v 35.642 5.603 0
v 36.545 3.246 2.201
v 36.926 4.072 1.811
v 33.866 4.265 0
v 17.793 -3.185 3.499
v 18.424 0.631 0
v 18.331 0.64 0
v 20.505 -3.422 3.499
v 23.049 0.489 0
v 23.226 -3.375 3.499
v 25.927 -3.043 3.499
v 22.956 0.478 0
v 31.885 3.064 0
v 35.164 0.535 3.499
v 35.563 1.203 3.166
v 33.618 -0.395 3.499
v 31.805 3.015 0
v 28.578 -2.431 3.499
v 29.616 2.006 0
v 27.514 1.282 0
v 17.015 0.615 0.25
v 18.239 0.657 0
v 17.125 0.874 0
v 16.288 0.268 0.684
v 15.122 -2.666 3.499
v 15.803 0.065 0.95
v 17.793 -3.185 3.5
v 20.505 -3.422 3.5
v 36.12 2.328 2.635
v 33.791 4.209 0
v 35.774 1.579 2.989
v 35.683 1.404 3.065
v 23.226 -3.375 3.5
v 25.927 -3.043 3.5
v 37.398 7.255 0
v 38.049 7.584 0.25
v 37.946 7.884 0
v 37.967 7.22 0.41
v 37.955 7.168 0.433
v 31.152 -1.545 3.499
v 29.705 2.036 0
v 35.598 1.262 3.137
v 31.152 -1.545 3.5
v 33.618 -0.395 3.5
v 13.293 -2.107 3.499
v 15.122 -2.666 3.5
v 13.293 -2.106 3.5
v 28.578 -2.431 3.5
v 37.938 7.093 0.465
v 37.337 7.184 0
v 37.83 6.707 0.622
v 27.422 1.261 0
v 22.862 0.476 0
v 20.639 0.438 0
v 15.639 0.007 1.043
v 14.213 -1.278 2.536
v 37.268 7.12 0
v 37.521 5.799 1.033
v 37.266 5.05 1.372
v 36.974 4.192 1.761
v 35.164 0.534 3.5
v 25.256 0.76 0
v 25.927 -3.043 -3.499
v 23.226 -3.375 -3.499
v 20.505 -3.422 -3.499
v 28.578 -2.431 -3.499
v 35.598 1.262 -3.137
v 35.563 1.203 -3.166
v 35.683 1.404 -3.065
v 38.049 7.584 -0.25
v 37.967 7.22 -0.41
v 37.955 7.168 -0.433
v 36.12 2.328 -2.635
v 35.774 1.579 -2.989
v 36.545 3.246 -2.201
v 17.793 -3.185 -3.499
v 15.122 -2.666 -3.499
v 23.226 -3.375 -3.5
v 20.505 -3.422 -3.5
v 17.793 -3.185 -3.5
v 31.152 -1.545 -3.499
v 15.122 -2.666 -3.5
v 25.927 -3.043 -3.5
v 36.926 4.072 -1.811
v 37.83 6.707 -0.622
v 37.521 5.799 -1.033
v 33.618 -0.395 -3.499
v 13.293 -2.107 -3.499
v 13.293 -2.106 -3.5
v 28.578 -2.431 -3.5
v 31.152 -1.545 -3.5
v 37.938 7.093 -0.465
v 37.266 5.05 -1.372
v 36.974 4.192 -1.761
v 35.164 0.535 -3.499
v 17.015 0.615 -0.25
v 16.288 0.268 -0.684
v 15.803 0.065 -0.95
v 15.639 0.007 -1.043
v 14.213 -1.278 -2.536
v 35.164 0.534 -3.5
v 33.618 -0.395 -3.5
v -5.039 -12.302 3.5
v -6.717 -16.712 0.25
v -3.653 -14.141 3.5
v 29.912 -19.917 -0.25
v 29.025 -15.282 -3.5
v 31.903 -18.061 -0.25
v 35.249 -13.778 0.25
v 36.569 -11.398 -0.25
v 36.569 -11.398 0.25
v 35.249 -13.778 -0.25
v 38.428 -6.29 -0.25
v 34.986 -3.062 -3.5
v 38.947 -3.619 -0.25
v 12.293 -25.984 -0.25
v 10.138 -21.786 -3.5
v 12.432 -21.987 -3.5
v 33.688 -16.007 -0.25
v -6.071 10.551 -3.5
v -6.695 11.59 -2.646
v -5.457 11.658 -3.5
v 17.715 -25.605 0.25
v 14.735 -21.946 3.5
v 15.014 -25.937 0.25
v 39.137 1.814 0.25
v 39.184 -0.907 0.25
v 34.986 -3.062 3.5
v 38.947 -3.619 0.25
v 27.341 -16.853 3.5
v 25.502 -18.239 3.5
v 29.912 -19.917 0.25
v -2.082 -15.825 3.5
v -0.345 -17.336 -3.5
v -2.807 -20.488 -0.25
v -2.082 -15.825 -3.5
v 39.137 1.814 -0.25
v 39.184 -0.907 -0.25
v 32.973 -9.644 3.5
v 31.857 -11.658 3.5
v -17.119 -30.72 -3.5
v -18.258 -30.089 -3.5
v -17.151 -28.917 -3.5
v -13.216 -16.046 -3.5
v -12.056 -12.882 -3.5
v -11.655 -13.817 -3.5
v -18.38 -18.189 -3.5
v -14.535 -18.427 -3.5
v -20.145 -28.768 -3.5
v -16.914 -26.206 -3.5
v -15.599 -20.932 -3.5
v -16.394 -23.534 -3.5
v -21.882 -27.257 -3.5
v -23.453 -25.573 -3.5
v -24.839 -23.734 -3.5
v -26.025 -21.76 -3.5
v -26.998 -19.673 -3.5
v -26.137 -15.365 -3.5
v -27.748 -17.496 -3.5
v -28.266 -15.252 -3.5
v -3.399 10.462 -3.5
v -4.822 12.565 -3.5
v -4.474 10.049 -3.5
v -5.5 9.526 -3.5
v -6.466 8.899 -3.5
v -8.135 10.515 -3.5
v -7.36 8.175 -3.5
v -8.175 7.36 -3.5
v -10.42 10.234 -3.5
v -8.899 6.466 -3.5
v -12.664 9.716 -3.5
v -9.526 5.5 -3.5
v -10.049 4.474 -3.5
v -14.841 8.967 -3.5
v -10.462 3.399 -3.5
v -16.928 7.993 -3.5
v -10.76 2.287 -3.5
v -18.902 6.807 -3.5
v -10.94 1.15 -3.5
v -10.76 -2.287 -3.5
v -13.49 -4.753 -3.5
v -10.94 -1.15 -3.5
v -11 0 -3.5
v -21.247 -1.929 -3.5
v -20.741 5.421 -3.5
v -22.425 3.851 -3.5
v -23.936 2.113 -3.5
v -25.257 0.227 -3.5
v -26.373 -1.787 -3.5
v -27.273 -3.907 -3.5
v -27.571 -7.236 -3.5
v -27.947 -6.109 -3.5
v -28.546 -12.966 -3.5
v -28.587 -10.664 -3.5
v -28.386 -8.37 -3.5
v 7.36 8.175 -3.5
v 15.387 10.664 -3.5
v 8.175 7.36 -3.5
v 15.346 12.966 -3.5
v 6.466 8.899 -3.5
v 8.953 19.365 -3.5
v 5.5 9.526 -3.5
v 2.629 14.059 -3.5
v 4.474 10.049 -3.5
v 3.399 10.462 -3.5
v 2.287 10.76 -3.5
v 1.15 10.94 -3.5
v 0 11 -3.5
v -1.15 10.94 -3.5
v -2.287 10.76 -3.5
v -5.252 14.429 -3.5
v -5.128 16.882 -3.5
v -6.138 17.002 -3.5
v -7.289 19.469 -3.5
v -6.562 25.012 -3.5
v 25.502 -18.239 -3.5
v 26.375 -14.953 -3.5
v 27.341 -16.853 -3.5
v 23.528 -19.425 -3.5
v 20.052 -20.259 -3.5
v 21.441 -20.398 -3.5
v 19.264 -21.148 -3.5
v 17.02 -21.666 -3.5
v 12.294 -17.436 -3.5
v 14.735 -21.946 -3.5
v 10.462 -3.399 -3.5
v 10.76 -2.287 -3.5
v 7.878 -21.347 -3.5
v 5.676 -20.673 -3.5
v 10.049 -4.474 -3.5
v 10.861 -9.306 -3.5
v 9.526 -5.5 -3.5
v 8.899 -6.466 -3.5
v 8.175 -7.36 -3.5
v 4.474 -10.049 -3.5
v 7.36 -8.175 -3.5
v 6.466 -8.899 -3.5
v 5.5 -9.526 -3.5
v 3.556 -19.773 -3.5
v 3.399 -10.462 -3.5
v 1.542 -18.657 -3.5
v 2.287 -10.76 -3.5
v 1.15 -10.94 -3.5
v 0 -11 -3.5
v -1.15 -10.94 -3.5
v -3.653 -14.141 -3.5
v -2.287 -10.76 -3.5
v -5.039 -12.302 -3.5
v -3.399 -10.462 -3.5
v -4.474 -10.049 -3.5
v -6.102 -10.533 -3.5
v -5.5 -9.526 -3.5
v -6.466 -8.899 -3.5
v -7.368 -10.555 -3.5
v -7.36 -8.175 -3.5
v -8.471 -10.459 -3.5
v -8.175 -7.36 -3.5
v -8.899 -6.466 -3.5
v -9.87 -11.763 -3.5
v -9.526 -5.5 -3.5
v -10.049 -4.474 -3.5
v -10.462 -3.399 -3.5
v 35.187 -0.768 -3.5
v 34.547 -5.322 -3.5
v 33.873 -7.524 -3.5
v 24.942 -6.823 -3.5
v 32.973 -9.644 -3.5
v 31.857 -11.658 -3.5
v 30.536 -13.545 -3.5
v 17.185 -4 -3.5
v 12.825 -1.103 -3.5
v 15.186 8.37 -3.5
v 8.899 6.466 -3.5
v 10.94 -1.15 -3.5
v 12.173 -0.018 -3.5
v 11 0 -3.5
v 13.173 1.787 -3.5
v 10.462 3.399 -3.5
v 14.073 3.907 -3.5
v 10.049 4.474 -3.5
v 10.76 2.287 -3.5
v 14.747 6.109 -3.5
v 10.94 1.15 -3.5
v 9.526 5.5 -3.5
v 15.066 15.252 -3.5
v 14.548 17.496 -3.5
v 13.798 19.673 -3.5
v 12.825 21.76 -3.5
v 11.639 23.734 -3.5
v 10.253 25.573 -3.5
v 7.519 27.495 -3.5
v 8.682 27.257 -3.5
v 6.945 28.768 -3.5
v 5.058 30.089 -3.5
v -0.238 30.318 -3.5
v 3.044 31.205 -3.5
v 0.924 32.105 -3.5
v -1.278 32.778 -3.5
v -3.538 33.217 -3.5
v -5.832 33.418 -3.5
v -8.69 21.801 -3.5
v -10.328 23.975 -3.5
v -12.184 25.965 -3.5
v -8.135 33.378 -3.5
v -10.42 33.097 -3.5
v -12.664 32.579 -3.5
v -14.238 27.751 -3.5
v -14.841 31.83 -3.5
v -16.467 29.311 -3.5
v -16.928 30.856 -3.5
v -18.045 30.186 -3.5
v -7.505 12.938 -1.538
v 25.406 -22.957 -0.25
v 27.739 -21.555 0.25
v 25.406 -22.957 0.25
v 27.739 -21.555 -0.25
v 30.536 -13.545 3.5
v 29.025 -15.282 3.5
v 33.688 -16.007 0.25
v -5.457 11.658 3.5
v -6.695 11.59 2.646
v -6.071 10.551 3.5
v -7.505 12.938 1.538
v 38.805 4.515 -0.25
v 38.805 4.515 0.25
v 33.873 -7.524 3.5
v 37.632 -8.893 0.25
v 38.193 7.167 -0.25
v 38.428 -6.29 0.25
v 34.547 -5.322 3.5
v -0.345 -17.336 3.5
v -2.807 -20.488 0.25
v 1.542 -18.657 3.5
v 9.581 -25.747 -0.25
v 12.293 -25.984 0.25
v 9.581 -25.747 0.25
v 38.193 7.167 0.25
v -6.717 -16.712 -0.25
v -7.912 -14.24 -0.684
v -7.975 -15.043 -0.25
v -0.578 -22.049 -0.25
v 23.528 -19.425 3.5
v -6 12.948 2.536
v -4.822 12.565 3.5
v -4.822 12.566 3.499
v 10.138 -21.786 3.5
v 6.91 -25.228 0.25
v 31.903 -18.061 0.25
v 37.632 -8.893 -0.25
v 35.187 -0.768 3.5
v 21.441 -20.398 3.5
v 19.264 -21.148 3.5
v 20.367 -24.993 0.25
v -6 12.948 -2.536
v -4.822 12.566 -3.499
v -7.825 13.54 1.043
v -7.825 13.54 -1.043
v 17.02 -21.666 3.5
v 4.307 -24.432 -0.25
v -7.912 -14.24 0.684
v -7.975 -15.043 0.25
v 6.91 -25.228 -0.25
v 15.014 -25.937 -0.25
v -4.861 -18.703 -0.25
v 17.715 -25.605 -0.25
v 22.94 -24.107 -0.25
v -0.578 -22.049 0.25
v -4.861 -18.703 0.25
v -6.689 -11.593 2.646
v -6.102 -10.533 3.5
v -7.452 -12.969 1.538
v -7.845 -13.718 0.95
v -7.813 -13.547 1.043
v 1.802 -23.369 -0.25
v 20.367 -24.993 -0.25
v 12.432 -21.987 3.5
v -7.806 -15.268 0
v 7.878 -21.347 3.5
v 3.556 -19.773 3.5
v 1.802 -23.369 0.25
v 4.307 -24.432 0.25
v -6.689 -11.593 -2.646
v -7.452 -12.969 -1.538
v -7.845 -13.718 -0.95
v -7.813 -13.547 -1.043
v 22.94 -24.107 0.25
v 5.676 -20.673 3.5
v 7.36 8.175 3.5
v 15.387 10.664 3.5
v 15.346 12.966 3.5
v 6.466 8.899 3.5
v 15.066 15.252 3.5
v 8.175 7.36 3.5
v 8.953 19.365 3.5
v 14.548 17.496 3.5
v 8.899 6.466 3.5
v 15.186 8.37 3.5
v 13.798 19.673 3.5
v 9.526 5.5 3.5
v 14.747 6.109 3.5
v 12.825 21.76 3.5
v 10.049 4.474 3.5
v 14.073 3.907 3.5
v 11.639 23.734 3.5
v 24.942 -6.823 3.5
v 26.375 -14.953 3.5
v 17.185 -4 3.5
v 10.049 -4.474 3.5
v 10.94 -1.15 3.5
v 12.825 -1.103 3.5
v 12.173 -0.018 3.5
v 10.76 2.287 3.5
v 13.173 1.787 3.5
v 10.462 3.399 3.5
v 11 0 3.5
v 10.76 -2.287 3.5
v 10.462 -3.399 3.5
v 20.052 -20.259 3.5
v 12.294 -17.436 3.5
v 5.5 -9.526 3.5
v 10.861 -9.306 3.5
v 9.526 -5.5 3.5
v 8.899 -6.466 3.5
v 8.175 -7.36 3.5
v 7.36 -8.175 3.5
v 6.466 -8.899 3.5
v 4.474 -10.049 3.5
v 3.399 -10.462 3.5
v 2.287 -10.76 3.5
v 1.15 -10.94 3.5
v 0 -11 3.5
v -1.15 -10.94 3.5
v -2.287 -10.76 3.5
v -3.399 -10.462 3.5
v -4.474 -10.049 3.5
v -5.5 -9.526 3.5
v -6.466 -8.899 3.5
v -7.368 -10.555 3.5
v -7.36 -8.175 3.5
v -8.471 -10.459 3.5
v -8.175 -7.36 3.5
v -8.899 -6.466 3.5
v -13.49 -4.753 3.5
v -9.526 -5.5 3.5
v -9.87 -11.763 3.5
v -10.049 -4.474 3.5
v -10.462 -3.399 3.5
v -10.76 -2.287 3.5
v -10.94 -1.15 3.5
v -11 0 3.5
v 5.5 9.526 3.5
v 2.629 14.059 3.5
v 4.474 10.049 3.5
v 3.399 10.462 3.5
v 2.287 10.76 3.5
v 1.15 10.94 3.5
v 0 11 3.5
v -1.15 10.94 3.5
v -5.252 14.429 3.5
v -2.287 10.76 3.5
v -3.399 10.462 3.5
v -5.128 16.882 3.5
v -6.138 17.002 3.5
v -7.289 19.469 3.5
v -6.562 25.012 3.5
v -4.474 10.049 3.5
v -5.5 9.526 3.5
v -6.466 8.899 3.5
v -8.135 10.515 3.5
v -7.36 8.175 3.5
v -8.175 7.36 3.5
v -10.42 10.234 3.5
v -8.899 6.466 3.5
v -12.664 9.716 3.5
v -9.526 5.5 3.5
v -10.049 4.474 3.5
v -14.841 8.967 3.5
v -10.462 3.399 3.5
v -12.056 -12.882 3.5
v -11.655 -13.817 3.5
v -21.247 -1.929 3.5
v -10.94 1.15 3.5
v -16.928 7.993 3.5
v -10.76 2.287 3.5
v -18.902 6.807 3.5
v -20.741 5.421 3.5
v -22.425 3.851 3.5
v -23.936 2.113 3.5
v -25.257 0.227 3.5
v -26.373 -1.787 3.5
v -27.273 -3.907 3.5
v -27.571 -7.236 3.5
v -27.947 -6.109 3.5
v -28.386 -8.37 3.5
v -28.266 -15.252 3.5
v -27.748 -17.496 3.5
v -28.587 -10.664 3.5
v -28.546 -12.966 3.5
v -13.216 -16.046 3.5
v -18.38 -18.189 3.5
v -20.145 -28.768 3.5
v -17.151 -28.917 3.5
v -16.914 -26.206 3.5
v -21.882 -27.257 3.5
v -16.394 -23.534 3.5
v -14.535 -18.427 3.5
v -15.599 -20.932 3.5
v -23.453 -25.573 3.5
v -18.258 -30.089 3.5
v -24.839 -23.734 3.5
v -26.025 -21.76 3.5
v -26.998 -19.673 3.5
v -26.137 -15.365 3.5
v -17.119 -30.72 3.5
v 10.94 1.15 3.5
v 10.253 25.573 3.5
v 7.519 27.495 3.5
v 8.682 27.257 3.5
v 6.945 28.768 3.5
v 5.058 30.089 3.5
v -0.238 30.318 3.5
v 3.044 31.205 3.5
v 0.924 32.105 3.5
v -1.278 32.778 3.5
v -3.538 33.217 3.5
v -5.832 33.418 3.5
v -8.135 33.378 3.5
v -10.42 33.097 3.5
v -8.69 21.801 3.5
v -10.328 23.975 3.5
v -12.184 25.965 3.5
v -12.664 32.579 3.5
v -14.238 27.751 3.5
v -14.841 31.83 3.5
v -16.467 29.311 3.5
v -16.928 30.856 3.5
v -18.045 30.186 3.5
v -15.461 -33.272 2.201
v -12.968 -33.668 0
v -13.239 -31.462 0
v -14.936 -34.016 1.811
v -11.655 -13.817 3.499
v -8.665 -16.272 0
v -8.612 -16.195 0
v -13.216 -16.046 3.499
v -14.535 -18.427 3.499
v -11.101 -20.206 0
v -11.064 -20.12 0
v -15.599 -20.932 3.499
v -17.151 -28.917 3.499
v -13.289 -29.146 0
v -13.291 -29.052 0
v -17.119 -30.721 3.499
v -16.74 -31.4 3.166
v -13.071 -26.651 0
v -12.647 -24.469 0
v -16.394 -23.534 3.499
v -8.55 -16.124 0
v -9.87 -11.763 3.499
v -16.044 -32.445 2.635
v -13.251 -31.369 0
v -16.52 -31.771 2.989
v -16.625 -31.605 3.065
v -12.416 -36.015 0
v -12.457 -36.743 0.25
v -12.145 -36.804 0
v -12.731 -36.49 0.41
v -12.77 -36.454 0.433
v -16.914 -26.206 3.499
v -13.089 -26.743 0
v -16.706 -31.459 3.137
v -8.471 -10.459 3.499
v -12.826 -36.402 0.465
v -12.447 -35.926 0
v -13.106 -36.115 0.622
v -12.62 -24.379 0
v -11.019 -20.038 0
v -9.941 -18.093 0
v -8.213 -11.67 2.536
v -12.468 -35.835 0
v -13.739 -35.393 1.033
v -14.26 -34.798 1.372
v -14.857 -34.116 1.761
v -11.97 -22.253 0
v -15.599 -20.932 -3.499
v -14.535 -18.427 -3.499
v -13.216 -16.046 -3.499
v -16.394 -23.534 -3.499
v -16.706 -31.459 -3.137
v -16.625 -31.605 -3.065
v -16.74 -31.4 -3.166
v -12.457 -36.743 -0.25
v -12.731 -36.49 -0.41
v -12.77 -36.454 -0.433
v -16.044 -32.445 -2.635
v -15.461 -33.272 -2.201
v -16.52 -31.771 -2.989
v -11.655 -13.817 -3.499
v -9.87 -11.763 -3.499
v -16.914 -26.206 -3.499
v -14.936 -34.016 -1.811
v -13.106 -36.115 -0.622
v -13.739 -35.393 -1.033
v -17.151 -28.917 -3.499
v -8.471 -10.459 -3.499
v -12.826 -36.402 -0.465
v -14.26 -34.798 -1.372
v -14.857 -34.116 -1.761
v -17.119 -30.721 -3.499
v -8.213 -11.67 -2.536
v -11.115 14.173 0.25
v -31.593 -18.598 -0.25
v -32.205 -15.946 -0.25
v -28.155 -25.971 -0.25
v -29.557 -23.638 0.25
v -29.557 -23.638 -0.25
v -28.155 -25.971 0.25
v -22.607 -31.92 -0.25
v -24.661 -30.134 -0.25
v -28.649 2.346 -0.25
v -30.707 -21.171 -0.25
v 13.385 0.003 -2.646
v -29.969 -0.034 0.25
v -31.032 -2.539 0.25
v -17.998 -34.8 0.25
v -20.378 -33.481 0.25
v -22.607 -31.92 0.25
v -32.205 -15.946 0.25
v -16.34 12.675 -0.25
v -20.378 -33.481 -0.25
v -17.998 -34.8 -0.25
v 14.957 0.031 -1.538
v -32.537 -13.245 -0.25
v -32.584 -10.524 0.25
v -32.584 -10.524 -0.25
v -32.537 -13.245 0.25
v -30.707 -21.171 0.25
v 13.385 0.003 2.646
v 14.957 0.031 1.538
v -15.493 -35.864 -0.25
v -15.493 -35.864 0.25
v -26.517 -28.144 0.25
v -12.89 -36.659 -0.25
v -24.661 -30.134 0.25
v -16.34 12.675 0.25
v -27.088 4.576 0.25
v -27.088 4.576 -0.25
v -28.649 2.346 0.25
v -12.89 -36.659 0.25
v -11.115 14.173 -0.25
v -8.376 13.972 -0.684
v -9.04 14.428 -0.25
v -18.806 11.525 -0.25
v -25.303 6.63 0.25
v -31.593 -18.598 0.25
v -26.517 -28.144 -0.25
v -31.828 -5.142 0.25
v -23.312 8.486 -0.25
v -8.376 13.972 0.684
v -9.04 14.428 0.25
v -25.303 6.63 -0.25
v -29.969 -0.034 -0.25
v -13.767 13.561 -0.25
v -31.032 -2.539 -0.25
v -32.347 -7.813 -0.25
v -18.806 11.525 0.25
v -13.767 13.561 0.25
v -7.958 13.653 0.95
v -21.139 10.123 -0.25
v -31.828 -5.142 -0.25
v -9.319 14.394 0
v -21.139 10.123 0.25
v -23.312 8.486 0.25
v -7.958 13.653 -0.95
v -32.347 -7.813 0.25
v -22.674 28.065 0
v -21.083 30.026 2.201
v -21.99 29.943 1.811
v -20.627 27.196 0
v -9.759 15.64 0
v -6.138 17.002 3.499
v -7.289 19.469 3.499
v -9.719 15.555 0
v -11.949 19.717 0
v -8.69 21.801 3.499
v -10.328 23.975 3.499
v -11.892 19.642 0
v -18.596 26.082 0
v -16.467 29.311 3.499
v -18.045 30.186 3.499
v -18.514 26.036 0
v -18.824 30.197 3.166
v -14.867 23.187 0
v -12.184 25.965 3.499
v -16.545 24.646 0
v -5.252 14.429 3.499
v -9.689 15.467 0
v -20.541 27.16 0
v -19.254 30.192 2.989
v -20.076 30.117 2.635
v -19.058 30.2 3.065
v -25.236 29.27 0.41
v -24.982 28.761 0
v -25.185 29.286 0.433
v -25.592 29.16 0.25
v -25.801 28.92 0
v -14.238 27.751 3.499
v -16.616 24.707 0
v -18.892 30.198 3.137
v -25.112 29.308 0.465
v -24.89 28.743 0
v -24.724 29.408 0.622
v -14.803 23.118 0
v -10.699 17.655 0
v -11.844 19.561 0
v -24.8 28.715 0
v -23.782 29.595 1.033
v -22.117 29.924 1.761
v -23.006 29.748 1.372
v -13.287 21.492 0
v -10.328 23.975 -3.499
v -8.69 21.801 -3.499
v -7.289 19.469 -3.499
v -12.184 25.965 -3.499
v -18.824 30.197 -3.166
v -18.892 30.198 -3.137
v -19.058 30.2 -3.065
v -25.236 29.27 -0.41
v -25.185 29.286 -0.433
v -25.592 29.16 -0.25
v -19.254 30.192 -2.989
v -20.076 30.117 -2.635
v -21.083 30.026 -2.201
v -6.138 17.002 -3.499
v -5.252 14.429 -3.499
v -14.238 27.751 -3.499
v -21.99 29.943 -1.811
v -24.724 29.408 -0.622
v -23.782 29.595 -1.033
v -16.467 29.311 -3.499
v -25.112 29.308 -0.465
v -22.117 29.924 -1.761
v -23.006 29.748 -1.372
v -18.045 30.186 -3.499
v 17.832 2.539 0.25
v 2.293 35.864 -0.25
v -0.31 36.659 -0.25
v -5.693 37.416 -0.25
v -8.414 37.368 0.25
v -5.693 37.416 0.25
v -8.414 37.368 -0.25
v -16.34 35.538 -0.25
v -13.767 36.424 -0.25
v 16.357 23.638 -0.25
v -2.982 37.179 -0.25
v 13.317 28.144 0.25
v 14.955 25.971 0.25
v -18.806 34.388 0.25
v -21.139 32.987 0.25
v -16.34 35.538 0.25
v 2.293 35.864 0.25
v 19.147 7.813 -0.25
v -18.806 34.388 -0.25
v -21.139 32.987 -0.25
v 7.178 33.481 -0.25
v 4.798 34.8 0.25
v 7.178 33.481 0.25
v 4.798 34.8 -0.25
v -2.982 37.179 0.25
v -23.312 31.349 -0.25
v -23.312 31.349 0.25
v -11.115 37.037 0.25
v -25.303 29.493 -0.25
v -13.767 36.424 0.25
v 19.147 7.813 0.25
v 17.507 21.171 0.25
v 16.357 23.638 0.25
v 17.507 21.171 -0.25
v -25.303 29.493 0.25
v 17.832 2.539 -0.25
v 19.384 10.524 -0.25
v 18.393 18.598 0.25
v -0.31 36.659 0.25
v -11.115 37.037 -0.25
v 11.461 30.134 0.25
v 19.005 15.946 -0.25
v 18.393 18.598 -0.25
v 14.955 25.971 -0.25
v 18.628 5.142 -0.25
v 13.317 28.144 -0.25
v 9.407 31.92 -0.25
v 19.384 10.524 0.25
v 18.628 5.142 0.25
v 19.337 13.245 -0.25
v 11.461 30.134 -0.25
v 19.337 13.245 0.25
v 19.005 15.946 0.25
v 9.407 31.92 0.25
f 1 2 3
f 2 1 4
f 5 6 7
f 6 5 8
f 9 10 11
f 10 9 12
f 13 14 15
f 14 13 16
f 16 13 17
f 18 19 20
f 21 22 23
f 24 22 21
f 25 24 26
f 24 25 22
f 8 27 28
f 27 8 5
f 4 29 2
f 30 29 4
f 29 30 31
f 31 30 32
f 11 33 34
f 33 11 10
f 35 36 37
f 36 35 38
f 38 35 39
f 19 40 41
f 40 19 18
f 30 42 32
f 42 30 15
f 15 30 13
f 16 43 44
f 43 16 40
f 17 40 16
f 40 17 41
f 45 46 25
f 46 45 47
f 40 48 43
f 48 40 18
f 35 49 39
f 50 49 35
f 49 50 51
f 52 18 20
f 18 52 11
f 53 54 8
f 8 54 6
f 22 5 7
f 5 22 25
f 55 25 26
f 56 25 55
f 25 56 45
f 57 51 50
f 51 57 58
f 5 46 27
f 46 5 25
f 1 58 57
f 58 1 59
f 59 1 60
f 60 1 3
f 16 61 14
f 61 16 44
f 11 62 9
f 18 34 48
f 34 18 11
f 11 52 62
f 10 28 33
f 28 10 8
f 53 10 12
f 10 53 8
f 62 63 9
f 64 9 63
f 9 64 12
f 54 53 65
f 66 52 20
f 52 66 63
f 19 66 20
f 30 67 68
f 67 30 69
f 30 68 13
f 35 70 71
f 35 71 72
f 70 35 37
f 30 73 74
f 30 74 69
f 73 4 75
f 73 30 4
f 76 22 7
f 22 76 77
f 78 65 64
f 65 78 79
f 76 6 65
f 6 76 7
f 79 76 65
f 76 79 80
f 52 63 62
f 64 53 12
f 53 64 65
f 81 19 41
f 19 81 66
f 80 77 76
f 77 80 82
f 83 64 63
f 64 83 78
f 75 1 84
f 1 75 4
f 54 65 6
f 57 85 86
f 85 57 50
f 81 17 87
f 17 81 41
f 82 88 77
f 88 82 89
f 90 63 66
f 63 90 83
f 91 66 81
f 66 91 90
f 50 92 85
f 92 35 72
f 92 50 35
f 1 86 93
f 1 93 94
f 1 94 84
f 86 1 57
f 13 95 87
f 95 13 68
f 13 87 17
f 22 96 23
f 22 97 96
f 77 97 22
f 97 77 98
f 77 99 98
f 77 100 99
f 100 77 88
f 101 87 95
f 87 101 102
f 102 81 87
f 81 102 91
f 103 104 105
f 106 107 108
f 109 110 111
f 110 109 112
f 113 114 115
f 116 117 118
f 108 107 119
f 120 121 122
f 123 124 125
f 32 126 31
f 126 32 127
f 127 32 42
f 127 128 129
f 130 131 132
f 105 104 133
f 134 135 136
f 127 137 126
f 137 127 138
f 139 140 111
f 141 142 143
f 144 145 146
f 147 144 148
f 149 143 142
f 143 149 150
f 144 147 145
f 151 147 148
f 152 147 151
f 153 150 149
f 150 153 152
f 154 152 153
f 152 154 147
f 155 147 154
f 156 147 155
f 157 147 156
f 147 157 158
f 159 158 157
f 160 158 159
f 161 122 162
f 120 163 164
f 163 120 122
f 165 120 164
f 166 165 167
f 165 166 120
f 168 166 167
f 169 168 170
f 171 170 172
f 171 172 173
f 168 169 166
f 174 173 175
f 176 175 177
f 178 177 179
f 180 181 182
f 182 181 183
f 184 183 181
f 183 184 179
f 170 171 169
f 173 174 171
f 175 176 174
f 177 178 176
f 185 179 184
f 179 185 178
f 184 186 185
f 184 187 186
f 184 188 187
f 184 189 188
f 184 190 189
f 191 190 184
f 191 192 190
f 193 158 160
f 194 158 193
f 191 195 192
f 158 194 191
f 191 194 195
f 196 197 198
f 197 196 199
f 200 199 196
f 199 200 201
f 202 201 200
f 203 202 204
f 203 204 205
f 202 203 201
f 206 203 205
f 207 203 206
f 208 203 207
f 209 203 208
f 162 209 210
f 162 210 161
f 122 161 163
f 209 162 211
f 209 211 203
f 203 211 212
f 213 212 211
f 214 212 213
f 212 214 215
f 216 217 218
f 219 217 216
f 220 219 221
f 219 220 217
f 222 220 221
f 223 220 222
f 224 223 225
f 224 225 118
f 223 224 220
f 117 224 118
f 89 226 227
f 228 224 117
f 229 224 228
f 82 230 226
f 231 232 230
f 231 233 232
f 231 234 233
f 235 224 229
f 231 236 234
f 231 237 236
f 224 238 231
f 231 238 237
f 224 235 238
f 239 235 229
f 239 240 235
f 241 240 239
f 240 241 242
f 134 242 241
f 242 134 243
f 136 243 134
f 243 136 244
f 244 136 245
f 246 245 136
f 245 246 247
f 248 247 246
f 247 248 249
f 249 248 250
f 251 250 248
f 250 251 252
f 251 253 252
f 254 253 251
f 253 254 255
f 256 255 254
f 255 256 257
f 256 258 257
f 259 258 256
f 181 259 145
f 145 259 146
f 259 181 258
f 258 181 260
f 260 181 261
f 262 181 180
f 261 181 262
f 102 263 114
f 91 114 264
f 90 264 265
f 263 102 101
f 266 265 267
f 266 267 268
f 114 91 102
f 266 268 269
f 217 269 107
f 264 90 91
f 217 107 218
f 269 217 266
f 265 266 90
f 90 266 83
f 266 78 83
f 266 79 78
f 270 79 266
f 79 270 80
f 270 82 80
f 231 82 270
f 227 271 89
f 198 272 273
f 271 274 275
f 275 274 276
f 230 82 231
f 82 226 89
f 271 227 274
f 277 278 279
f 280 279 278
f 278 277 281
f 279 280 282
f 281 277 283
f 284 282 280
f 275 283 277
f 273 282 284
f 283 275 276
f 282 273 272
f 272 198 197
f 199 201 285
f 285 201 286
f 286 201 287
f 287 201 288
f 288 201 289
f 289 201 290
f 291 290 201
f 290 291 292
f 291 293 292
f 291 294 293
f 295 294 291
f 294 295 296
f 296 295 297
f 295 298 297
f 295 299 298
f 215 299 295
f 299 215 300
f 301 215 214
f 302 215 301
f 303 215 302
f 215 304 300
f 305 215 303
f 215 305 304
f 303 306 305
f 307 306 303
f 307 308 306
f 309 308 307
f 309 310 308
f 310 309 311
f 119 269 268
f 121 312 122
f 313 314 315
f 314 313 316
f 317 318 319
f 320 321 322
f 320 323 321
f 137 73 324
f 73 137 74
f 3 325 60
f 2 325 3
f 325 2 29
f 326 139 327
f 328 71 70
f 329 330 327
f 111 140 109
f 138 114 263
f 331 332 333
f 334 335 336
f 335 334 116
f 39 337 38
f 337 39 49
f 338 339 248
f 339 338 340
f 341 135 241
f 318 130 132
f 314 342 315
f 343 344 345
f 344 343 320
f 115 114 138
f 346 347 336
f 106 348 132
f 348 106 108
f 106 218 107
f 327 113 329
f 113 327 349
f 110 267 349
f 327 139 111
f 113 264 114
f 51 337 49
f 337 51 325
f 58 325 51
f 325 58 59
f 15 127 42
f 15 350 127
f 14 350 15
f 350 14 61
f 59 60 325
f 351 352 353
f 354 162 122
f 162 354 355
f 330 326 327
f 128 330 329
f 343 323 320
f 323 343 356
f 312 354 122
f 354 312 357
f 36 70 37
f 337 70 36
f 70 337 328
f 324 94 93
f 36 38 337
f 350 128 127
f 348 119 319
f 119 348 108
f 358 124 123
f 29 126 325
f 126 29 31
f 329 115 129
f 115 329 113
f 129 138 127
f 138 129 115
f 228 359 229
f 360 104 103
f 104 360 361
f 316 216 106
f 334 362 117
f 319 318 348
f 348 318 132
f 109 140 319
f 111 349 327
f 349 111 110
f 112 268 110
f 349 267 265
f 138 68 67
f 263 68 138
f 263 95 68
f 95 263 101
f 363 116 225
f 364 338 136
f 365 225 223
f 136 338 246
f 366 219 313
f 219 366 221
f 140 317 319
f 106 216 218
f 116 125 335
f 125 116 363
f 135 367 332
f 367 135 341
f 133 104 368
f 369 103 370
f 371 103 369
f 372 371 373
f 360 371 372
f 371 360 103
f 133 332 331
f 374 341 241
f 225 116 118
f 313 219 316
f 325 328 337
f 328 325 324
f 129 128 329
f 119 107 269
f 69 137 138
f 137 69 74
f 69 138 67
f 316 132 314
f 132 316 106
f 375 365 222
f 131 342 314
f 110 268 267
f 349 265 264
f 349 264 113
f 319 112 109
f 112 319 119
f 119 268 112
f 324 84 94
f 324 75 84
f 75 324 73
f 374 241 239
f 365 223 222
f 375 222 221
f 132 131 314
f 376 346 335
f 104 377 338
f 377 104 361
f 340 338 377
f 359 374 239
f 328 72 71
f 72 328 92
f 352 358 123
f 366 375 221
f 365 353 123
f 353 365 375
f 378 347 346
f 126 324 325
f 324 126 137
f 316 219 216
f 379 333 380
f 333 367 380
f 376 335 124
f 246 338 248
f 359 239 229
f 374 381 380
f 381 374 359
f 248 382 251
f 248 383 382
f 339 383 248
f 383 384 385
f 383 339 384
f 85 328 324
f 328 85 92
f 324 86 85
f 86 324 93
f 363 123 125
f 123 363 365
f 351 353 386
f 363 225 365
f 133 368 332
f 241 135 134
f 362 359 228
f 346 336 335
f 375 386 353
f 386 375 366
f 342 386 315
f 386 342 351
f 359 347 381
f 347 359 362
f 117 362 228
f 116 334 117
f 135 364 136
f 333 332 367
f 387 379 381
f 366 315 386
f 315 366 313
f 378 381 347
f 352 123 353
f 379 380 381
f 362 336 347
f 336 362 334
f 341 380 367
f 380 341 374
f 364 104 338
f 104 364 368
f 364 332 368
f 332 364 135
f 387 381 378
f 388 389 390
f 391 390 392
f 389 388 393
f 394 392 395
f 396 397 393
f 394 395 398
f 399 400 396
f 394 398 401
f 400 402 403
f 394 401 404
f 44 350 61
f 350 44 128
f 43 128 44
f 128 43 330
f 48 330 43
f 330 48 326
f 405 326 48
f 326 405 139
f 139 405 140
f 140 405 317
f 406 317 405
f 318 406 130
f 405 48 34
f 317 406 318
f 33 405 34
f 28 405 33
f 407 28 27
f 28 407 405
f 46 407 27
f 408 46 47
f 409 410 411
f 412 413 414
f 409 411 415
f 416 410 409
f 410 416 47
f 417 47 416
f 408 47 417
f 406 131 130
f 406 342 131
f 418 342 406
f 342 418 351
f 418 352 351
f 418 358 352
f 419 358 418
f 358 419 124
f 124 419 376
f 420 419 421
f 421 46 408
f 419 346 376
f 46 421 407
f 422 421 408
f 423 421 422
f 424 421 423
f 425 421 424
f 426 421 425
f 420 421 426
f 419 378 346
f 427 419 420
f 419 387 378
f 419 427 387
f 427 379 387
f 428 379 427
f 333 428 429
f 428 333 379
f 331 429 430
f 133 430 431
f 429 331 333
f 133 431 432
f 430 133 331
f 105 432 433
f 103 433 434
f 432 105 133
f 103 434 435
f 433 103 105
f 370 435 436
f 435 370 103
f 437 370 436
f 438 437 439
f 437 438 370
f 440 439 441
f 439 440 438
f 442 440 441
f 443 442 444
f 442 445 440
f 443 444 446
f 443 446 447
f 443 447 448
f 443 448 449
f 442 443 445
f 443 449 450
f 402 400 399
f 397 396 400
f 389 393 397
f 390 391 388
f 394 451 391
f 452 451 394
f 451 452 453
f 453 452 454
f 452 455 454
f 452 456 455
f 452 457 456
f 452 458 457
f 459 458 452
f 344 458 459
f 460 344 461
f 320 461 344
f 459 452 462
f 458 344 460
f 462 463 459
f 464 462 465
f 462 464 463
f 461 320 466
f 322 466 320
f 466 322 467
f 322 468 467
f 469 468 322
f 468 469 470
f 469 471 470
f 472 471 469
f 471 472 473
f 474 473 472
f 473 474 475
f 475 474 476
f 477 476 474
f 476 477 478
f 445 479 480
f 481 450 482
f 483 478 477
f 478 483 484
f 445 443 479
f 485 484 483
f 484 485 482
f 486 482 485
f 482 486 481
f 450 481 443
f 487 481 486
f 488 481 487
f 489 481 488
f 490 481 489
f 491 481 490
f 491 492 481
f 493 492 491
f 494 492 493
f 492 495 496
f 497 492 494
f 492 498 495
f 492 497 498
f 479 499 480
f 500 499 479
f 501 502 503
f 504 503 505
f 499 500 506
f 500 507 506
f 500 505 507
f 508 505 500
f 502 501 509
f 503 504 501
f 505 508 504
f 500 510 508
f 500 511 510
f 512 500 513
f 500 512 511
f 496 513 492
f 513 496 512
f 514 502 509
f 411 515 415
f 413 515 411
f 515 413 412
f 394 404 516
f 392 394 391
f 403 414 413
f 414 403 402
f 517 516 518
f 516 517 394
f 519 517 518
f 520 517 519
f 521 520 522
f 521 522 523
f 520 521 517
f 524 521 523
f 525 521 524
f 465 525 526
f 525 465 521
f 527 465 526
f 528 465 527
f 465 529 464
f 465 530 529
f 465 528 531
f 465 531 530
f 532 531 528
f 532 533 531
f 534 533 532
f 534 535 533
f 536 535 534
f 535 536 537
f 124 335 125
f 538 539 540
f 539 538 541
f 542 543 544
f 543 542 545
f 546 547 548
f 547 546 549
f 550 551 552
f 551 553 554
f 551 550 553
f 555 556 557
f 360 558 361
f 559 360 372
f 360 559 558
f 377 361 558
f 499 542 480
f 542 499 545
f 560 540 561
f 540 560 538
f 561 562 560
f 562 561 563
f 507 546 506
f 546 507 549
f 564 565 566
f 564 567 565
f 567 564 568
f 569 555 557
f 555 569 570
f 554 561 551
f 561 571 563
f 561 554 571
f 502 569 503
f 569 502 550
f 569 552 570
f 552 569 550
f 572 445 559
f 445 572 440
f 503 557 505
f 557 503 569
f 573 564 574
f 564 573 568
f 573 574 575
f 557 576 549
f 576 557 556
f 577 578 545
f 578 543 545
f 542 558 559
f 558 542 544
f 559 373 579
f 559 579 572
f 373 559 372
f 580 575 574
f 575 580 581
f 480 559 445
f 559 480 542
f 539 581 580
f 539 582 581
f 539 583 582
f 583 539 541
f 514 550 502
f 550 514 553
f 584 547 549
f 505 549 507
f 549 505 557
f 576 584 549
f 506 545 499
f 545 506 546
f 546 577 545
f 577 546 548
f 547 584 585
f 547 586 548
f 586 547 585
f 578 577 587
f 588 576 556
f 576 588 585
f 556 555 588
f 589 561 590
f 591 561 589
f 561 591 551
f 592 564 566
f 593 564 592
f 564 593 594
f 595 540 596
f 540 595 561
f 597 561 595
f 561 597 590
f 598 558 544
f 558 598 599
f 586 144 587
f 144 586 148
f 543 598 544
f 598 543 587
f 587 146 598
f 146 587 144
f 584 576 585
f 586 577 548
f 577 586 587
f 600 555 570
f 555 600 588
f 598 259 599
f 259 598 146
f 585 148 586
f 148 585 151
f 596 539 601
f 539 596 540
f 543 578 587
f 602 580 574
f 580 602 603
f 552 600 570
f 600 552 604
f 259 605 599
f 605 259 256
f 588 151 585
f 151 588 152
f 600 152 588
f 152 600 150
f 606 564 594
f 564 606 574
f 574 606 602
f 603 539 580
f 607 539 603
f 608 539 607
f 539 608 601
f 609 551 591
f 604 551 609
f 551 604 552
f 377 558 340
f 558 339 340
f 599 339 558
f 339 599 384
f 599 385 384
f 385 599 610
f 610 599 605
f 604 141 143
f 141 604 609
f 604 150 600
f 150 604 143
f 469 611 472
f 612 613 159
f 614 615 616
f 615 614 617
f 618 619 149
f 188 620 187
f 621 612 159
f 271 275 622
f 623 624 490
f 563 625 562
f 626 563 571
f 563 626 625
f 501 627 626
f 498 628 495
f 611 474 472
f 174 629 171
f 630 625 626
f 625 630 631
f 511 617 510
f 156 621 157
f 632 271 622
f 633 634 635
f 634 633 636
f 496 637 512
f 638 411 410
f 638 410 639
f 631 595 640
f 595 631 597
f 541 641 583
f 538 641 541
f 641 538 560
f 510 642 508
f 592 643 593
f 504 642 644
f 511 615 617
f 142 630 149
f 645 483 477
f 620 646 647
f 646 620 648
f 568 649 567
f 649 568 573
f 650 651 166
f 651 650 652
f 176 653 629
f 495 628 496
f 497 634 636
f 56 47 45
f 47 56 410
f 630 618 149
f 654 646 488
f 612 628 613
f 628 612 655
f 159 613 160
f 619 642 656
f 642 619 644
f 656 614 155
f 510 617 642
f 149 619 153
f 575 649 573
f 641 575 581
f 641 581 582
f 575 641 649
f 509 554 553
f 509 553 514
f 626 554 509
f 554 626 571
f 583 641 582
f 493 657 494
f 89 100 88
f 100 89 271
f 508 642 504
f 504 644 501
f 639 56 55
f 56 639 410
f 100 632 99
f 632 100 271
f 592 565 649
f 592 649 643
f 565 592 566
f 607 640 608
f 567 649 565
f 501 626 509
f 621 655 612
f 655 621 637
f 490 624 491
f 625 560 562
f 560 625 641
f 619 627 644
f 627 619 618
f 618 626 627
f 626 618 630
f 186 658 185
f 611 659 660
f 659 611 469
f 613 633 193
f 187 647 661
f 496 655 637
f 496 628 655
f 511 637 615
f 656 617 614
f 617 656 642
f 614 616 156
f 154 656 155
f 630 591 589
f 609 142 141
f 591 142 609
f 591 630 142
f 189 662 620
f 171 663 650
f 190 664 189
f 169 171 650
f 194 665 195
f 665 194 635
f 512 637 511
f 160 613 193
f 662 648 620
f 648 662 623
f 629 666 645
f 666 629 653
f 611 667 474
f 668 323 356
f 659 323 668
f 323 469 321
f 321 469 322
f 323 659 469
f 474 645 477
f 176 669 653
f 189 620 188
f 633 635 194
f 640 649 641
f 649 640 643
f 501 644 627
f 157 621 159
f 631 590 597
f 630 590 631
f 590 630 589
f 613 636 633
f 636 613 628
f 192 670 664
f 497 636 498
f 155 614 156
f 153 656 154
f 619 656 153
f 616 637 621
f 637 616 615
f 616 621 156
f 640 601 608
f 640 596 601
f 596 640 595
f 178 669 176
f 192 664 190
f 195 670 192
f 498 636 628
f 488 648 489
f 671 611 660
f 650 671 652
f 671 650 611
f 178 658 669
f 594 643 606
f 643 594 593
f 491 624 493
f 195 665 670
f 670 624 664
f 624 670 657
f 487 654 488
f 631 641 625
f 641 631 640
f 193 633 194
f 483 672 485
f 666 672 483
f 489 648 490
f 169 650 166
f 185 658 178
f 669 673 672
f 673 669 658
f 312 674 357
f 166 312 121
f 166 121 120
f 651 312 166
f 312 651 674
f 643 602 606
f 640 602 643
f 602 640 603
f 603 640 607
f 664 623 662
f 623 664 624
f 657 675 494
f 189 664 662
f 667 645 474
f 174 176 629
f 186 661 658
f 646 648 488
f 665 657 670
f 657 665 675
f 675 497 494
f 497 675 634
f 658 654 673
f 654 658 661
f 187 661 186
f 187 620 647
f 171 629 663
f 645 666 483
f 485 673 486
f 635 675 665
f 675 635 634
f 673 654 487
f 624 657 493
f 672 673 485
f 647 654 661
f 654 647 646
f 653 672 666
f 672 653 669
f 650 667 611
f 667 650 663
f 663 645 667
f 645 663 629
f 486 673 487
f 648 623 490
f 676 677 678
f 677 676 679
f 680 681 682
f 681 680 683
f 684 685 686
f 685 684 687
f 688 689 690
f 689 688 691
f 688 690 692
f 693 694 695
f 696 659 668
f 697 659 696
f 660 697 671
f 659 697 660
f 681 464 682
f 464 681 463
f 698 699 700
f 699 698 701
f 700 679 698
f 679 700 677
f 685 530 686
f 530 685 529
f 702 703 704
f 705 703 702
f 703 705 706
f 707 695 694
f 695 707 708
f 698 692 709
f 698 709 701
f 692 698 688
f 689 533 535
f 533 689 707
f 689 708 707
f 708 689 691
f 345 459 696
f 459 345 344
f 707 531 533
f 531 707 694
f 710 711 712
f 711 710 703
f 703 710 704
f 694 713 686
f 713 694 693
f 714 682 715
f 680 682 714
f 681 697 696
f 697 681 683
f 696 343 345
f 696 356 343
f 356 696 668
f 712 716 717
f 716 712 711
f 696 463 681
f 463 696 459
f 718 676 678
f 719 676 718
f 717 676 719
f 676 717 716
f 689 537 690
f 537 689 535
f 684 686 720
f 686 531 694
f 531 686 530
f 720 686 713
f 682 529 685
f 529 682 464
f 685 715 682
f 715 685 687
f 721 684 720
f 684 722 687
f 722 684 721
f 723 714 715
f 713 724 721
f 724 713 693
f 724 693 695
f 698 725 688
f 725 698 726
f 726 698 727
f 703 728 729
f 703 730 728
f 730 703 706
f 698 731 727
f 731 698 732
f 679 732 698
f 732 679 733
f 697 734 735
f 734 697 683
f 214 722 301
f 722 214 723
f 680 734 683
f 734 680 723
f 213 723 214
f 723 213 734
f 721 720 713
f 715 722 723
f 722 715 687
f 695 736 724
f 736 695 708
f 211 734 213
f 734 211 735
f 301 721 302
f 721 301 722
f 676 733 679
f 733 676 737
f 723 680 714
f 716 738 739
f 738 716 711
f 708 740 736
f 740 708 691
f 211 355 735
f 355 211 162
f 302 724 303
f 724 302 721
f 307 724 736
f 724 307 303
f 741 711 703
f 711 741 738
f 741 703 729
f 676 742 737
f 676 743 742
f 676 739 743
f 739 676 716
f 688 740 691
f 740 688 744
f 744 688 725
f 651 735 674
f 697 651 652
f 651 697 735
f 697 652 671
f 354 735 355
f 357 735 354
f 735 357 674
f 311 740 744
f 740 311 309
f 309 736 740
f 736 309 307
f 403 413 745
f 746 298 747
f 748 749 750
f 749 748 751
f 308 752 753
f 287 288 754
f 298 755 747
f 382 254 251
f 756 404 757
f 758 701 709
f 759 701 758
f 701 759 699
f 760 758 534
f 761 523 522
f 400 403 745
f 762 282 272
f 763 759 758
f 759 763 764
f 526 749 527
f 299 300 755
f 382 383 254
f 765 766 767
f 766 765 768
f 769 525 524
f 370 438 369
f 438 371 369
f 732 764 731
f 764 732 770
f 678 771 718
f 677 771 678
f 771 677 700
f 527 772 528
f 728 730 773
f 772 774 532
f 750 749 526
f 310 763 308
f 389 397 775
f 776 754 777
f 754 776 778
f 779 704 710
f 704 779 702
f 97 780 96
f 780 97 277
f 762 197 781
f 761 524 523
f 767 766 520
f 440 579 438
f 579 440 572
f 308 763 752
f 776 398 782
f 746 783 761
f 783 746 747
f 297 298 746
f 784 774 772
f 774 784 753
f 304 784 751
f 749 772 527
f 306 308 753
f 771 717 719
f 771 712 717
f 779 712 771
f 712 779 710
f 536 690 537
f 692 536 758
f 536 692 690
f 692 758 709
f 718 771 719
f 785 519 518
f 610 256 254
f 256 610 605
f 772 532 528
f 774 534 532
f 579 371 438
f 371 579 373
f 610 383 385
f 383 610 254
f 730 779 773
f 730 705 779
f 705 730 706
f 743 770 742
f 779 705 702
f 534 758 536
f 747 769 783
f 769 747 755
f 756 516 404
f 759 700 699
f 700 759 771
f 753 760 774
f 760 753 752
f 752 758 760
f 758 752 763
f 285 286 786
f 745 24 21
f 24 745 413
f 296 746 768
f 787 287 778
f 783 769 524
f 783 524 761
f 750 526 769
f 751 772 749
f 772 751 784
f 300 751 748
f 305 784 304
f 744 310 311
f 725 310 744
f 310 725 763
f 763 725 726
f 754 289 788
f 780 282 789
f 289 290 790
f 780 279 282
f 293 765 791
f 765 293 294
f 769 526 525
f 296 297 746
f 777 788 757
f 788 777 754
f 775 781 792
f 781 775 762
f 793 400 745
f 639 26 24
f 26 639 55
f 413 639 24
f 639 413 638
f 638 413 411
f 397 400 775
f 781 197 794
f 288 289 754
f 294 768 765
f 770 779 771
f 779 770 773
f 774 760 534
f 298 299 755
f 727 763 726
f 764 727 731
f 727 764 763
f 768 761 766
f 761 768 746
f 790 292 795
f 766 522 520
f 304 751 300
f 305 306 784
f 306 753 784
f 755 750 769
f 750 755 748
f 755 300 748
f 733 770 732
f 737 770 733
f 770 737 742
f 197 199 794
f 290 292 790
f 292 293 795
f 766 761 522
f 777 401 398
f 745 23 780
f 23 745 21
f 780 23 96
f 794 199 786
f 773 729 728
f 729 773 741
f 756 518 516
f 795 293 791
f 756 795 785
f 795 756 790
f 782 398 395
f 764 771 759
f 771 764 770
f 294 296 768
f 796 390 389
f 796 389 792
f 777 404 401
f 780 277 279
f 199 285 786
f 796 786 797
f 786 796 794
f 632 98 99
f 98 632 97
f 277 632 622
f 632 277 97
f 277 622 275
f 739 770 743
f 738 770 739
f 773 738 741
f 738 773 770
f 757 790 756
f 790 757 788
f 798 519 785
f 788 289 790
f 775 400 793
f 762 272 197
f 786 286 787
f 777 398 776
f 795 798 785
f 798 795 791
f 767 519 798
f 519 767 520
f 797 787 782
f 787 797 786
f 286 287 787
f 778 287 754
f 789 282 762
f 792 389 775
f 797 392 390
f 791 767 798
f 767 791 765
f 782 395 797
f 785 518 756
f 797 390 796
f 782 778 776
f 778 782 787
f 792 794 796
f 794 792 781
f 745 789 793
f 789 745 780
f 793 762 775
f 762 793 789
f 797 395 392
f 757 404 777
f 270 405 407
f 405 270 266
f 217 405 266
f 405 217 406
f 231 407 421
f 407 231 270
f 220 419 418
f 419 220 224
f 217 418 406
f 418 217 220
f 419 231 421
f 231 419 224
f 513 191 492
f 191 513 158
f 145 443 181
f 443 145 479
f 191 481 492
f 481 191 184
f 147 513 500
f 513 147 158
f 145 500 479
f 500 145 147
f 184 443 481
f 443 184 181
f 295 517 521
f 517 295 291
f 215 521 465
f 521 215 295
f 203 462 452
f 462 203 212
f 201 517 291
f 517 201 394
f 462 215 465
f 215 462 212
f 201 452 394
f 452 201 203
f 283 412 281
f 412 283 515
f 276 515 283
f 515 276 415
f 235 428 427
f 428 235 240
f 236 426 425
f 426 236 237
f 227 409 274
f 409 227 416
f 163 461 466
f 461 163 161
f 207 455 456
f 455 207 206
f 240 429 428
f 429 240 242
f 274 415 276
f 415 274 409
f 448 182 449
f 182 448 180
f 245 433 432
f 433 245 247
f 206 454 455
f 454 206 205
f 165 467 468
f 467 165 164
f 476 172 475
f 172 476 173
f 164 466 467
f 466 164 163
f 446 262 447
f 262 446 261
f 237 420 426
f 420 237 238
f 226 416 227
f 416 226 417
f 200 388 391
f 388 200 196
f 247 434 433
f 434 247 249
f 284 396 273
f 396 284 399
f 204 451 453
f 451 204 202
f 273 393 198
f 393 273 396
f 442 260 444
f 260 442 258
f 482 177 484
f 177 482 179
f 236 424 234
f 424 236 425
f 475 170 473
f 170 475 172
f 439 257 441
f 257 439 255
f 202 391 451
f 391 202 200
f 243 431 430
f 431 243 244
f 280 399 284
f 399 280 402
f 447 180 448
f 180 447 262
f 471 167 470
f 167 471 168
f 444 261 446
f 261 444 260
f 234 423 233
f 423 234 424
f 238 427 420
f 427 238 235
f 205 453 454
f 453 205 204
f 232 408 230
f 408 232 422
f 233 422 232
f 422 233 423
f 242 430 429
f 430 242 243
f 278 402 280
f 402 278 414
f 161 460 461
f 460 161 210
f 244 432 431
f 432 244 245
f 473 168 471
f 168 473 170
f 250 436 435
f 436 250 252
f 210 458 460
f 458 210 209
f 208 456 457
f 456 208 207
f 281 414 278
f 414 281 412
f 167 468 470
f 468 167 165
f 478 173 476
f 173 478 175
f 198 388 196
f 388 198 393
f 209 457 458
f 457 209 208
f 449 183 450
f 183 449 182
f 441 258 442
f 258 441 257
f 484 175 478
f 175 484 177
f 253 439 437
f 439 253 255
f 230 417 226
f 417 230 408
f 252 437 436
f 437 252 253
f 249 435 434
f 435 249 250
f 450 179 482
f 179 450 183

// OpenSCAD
// lucina
// 2017-09-29

// preview[view:south, tilt:top]

// the number of blades
blades = 3; //[2, 3, 4, 5, 6]

// the type of weight
whichWeight = "3/8 hex nut";   //[608 bearing, 5/16 hex nut, 3/8 hex nut, 1/2 hex nut, M8 hex nut, M10 16 hex nut, M10 17 hex nut, M12 18 hex nut, M12 19 hex nut, M4 square nut, 5/16 ball bearing, 3/8 ball bearing, 1/2 ball bearing, 5/8 ball bearing, 1 inch ball bearing]
// blade rotation in degrees
bladeRotation = 20;  //[0:1:45]
// blade offset from center (smaller=more compact)
bladeOffset = .6; //[.55:.05:1.2]
// number of beveled edges
edges = "double"; //[single, double]

/* [Hidden] */
$fn = 60;
inch = 25.4;
x = 0; y = 1; z = 2;
bearing = [22, 22, 7]; //608 bearing
sae = [.577*inch, .5 * inch, 7]; // 5/16 hex nut
sae38 = [.650*inch,.562*inch, 7];	// 3/8 
sae12 = [.866*inch, .75*inch, 7];	// 1/2
metric8 = [15, 13, 7];   // M8 hex nut
metric10_16 = [17.77, 16, 7];   // M10 16 hex nut
metric10_17 = [19.6, 17, 7];   // M10 17 hex nut
metric12_18 = [20.03, 18, 7];   // M12 18 hex nut
metric12_19 = [21.9, 19, 7];   // M12 19 hex nut
metric4sq = [7, 7, 3.2];
ball516 = [5/16*inch, 5/16*inch, 5/16*inch];
ball38 = [3/8*inch, 3/8*inch, 3/8*inch];
ball12 = [1/2*inch, 1/2*inch, 1/2*inch];
ball58 = [5/8*inch, 5/8*inch, 5/8*inch];
ball1 = [inch, inch, inch];

weight = (whichWeight == "608 bearing") ? bearing :
   (whichWeight == "5/16 hex nut") ? sae :
   (whichWeight == "3/8 hex nut") ? sae38 :
   (whichWeight == "1/2 hex nut") ? sae12 :
   (whichWeight == "M8 hex nut") ? metric8 :
   (whichWeight == "M10 16 hex nut") ? metric10_16 :
   (whichWeight == "M10 17 hex nut") ? metric10_17 :
   (whichWeight == "M12 18 hex nut") ? metric12_18 :
   (whichWeight == "M12 19 hex nut") ? metric12_19 :
   (whichWeight == "M4 square nut") ? metric4sq :
   (whichWeight == "5/16 ball bearing") ? ball516 :
   (whichWeight == "3/8 ball bearing") ? ball38 :
   (whichWeight == "1/2 ball bearing") ? ball12 :
   (whichWeight == "5/8 ball bearing") ? ball58 : ball1;
echo(whichWeight, weight[x], weight[y], weight[z]);
resolution = (whichWeight == "5/16 hex nut") ? 6 :
(whichWeight == "3/8 hex nut") ? 6 :
(whichWeight == "1/2 hex nut") ? 6 :
(whichWeight == "M8 hex nut") ? 6 :
(whichWeight == "M10 16 hex nut") ? 6 :
(whichWeight == "M10 17 hex nut") ? 6 :
(whichWeight == "M12 18 hex nut") ? 6 :
(whichWeight == "M12 19 hex nut") ? 6 :
(whichWeight == "M4 square nut") ? 4 : 40;

step = 360 / blades;
stop = (blades-1) * step;
bladeWidth = 22 * weight[x] / sae38[x];
bladeThick = bearing[z];
bladeEdge = 4;
offset = bladeOffset * sae38[x] / weight[x];
rotation = -bladeRotation;
cutOffset = (edges == "double") ? 3.5 : 1;

module blade(th, rad) {
   translate([offset*bladeWidth, 0, 0])
      rotate([0, 0, rotation])
         difference() {
            hull() {
               cylinder(h=th, r=rad, center=true);
               cylinder(h=.5, r=rad+bladeEdge, center=true);
            }
            // cut out  blade
            if ( edges == "single")
               translate([0, weight[x]+bladeEdge+cutOffset*weight[x]/sae38[x], 0])
                  cylinder(h=th*2, r=rad, center=true);
            if ( edges == "double")
               translate([0, weight[x]+bladeEdge+cutOffset*weight[x]/sae38[x], 0])
               union() {
                  hull() {
                     cylinder(h=.25, r=rad, center=true);
                     translate([0, 0, 3.5])
                        cylinder(h=.001, r=rad+bladeEdge, center=true);
                  }
                  hull() {
                     cylinder(h=.25, r=rad, center=true);
                     translate([0, 0, -3.5])
                        cylinder(h=.001, r=rad+bladeEdge, center=true);
                  }
                  }
               }
}
module fcylinder(z, x, rad) {
   minkowski() {
      cylinder(h=z-2*rad, d=x-2*rad, center=true);
         sphere(rad, center=true);
   }
}

difference () {
   union() {
      fcylinder(bearing[z], bearing[x] + 5, 2);
      for ( angle = [0 : step : stop] )
         rotate([0, 0, -angle])
         blade(bladeThick, bladeWidth);
   }
   union() {
      // center hole
      cylinder(h=7*2, d=22, center=true);
         for ( angle = [0 : step : stop] )
            rotate([0, 0, -angle])
               // weight hole
               translate([offset*bladeWidth, 0, 0])
                  rotate([0, 0, rotation])
                     translate([.42*bladeWidth, -bladeWidth+weight[x]/2+weight[x]/sae38[x]*4.2, 0])
                        cylinder(h=bearing[z]*4, d=weight[x], $fn=resolution, center=true);
   }
}
